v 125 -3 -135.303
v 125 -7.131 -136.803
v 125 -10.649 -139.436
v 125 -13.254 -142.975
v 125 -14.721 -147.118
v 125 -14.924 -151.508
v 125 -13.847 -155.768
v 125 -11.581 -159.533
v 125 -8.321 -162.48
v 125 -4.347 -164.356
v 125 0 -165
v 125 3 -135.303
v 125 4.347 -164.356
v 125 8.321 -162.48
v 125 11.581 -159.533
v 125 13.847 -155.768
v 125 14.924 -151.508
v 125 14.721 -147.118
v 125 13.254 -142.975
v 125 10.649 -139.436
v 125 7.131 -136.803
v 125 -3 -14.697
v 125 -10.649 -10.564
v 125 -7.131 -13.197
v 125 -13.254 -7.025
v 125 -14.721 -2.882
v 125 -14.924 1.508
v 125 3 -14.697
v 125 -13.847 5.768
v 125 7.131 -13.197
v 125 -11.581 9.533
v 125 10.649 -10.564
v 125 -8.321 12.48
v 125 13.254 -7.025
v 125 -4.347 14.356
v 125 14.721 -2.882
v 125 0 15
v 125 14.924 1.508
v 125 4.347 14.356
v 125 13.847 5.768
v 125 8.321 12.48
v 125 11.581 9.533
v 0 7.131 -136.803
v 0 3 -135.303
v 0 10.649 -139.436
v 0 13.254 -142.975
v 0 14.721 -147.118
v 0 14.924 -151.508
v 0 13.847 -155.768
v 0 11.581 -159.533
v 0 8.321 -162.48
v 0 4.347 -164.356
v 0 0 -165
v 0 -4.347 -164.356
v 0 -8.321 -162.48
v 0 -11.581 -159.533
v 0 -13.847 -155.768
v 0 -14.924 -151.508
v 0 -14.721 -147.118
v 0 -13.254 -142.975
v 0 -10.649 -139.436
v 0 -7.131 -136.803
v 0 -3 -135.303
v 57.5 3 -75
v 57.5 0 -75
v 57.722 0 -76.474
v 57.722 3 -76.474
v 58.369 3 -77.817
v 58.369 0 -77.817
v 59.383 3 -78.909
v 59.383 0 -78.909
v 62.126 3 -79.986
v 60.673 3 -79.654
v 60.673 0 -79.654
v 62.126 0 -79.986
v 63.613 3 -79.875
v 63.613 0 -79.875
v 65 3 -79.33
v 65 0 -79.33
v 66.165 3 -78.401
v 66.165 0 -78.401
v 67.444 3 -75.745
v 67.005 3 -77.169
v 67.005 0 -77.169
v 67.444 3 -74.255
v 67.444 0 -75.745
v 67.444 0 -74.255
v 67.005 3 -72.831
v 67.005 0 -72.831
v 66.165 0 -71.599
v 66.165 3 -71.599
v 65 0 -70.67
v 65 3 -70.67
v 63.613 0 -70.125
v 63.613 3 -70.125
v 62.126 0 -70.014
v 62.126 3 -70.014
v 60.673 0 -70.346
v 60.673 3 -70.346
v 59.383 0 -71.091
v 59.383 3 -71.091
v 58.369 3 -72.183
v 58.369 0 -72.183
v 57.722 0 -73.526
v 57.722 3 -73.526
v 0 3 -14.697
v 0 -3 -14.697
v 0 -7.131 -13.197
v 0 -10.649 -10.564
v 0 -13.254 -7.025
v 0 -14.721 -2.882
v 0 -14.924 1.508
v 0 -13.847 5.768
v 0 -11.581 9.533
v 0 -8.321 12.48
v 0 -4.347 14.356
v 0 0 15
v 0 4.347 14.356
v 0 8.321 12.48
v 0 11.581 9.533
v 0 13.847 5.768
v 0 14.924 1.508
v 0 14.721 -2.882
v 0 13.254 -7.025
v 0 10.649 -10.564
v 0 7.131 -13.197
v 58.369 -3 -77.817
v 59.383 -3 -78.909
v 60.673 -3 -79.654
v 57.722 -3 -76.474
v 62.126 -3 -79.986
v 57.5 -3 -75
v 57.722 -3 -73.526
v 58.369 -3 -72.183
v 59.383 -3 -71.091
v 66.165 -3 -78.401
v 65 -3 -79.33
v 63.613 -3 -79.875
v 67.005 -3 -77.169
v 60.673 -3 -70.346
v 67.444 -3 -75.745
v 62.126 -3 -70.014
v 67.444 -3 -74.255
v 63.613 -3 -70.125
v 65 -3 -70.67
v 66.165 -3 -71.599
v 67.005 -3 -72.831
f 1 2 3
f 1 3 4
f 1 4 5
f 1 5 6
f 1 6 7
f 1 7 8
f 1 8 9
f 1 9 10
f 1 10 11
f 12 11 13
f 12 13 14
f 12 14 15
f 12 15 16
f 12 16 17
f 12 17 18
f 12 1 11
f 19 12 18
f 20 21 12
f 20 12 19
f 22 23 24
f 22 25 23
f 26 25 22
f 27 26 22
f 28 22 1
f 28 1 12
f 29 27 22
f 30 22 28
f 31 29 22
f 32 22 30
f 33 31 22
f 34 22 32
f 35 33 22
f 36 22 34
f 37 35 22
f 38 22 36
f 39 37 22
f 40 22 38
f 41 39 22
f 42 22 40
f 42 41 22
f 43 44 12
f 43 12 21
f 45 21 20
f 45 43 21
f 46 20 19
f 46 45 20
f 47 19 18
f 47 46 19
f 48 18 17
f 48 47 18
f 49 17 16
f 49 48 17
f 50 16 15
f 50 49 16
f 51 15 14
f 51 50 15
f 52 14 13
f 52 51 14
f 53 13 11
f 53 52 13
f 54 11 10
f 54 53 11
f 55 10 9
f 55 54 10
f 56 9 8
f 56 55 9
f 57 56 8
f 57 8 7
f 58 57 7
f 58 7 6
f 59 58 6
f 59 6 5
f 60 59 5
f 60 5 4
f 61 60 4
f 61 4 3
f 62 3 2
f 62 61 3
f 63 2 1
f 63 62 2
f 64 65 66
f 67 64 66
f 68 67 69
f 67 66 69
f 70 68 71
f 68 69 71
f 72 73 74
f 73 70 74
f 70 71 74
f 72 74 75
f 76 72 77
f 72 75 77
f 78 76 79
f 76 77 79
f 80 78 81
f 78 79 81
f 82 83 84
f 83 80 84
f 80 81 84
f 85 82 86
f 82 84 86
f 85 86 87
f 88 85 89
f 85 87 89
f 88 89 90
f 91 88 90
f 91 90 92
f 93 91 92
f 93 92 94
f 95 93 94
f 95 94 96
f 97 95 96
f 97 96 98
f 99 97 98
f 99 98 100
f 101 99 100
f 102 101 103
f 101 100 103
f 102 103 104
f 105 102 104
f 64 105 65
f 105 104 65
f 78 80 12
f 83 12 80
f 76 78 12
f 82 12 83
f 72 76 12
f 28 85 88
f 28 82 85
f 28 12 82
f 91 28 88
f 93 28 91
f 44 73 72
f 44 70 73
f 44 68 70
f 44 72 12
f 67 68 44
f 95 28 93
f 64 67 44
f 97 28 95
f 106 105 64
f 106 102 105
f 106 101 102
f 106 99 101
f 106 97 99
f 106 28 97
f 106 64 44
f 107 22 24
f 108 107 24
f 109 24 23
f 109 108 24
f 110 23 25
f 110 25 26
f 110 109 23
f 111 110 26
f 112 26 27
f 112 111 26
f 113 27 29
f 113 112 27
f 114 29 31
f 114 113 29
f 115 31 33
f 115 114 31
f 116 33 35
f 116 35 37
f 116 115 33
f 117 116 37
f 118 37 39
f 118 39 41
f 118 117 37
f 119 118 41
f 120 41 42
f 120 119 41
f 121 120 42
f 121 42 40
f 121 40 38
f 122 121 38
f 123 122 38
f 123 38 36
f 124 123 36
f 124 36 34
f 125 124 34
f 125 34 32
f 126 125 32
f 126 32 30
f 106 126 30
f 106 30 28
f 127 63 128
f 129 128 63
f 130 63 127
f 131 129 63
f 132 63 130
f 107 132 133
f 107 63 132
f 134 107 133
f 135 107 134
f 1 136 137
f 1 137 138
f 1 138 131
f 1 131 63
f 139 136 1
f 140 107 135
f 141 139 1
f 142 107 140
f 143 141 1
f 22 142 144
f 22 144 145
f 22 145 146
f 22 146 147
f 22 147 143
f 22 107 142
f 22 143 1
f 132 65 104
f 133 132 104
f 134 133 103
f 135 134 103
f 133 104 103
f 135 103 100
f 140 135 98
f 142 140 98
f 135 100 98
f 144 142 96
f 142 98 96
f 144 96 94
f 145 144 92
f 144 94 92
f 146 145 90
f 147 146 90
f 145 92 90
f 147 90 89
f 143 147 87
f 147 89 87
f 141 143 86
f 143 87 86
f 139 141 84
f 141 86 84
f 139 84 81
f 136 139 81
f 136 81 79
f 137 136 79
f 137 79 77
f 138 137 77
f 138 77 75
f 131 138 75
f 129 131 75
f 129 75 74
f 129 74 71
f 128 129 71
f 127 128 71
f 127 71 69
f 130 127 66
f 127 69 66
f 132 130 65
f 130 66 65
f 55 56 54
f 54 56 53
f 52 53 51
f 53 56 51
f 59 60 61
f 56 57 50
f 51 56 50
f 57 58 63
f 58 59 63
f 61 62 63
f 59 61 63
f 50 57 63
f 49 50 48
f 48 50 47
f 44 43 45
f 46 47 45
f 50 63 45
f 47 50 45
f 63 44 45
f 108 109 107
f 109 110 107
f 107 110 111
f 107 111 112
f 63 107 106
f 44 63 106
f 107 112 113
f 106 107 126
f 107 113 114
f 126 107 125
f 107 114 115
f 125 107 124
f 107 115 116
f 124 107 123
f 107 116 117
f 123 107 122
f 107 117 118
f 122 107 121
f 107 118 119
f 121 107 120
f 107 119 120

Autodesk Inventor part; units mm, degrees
ref_plane "YZ Plane" through (0, 0, 0) normal (1, 0, 0) x (0, 1, 0)
ref_plane "XZ Plane" through (0, 0, 0) normal (0, 1, 0) x (-1, 0, 0)
ref_plane "XY Plane" through (0, 0, 0) normal (0, 0, 1) x (1, 0, 0)
sketch "Sketch1" plane through (0, 0, 0) normal (0, 0, 1) x (1, 0, 0)
  point P0 (0, 0)
sketch "Sketch2" plane through (0, 0, 0) normal (1, 0, 0) x (0, 1, 0)
  circle A0 centre (0, 0) radius 15
  circle A1 centre (0, -150) radius 15
  dimension "d0" = 30
  dimension "d1" = 30
  dimension "d2" = 150
  dimension "d3" = 0
extrude "Extrusion1" add sketch "Sketch2" along normal blind 125
sketch "Sketch3" plane through (0, 0, 0) normal (0, 0, 1) x (1, 0, 0)
  line L0 (125, -15) -> (125, 15) projected
  line L1 (0, 15) -> (0, -15) projected
  line L2 (0, 15) -> (125, 15) projected
  line L3 (0, -15) -> (125, -15) projected
  line L4 (125, 3) -> (0, 3)
  line L5 (0, 3) -> (0, -3)
  line L6 (0, -3) -> (125, -3)
  line L7 (125, -3) -> (125, 3)
  point P0 (0, 0)
  dimension "d10" = 3
  dimension "d11" = 3
extrude "Extrusion2" add sketch "Sketch3" against normal blind 150 contours L6 L1 L4 L0
sketch "Sketch4" plane through (0, -3, -14.6969) normal (0, -1, 0) x (1, 0, 0)
  point P0 (0, 14.6969)
sketch "Sketch5" plane through (0, 0, 0) normal (0, 1, 0) x (-1, 0, 0)
  line L0 (-125, -14.6969) -> (0, -14.6969) projected
  line L1 (-125, -14.6969) -> (-125, -135.3031) projected
  line L2 (0, -135.3031) -> (-125, -135.3031) projected
  line L3 (0, -14.6969) -> (0, -135.3031) projected
  line L4 (0, -14.6969) -> (-125, -14.6969) projected
  line L5 (-125, -14.6969) -> (-125, -14.6969) projected
  line L6 (-125, -14.6969) -> (0, -14.6969) projected
  line L7 (0, -14.6969) -> (0, -14.6969) projected
  line L8 (0, 15) -> (-125, 15) projected
  line L9 (0, -165) -> (-125, -165) projected
  circle A0 centre (-62.5, -75) radius 5
  point P0 (0, 0)
  dimension "d18" = 10
  dimension "d19" = 90
  dimension "d20" = 62.5
extrude "Extrusion3" cut sketch "Sketch5" along normal mid plane 6 contours A0
properties part number "EE_Base-Rod-Rev1"
